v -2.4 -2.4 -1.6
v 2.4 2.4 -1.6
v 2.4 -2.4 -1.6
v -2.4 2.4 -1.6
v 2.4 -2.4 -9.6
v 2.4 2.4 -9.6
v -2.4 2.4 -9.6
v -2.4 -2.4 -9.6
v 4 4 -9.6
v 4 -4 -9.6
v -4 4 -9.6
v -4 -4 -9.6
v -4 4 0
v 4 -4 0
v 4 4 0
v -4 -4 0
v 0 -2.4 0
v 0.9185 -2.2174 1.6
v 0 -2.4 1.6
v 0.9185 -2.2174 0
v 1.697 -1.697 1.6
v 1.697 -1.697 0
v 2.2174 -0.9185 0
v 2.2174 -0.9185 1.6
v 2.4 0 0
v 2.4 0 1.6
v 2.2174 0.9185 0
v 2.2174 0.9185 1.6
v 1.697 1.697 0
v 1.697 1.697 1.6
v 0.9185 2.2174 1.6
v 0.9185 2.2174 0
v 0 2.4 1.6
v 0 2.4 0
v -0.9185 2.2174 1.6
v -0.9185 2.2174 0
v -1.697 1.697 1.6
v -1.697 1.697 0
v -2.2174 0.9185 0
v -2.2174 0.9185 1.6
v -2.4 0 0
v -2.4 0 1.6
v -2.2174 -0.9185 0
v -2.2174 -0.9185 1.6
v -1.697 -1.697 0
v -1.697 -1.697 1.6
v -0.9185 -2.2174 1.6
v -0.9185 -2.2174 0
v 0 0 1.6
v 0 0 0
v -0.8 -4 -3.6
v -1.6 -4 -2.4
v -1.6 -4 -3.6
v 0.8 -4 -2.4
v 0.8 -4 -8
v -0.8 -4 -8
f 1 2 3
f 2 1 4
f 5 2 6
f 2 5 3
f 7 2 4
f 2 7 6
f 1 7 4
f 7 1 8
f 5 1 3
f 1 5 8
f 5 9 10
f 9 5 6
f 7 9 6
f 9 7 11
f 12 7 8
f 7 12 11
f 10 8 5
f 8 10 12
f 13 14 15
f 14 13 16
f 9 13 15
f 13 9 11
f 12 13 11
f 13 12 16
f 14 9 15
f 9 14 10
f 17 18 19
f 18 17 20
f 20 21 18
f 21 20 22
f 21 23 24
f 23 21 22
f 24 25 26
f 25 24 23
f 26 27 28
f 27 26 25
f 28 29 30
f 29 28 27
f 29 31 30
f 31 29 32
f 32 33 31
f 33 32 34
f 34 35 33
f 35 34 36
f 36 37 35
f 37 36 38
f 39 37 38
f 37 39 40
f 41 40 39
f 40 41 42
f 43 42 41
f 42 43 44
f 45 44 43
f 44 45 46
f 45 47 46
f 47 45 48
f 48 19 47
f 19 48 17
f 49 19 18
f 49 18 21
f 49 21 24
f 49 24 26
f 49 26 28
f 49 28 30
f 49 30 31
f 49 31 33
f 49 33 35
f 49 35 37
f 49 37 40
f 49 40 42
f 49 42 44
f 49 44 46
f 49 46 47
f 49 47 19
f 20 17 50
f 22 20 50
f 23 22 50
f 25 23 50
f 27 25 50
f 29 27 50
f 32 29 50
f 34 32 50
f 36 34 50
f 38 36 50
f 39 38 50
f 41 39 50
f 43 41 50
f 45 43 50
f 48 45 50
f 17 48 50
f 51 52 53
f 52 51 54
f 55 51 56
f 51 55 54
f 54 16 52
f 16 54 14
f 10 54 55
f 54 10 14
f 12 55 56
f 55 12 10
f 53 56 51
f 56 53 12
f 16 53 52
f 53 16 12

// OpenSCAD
// file: ../p/4-4edge.scad
use <../lib.scad>
function ldraw_lib__4_4edge() = [
// 0 Circle 1.0
// 0 Name: 4-4edge.dat
// 0 Author: James Jessiman
// 0 !LDRAW_ORG Primitive UPDATE 2017-01
// 0 !LICENSE Licensed under CC BY 2.0 and CC BY 4.0 : see CAreadme.txt
// 
// 0 BFC CERTIFY CCW
  [0,"BFC","CERTIFY"],
  [0,"BFC","CCW"],
// 
// 0 !HISTORY 1998-12-15 [PTadmin] Official Update 1998-10
// 0 !HISTORY 2005-12-28 [PTadmin] Official Update 2005-01
// 0 !HISTORY 2007-06-24 [PTadmin] Header formatted for Contributor Agreement
// 0 !HISTORY 2008-07-01 [PTadmin] Official Update 2008-01
// 0 !HISTORY 2017-01-15 [Steffen] BFCed
// 0 !HISTORY 2017-12-30 [PTadmin] Official Update 2017-01
// 
// 
// 2 24 1 0 0 0.9239 0 0.3827
  [2,24,1,0,0,0.9239,0,0.3827],
// 2 24 0.9239 0 0.3827 0.7071 0 0.7071
  [2,24,0.9239,0,0.3827,0.7071,0,0.7071],
// 2 24 0.7071 0 0.7071 0.3827 0 0.9239
  [2,24,0.7071,0,0.7071,0.3827,0,0.9239],
// 2 24 0.3827 0 0.9239 0 0 1
  [2,24,0.3827,0,0.9239,0,0,1],
// 2 24 0 0 1 -0.3827 0 0.9239
  [2,24,0,0,1,-0.3827,0,0.9239],
// 2 24 -0.3827 0 0.9239 -0.7071 0 0.7071
  [2,24,-0.3827,0,0.9239,-0.7071,0,0.7071],
// 2 24 -0.7071 0 0.7071 -0.9239 0 0.3827
  [2,24,-0.7071,0,0.7071,-0.9239,0,0.3827],
// 2 24 -0.9239 0 0.3827 -1 0 -0
  [2,24,-0.9239,0,0.3827,-1,0,-0],
// 2 24 -1 0 -0 -0.9239 0 -0.3827
  [2,24,-1,0,-0,-0.9239,0,-0.3827],
// 2 24 -0.9239 0 -0.3827 -0.7071 0 -0.7071
  [2,24,-0.9239,0,-0.3827,-0.7071,0,-0.7071],
// 2 24 -0.7071 0 -0.7071 -0.3827 0 -0.9239
  [2,24,-0.7071,0,-0.7071,-0.3827,0,-0.9239],
// 2 24 -0.3827 0 -0.9239 0 0 -1
  [2,24,-0.3827,0,-0.9239,0,0,-1],
// 2 24 0 0 -1 0.3827 0 -0.9239
  [2,24,0,0,-1,0.3827,0,-0.9239],
// 2 24 0.3827 0 -0.9239 0.7071 0 -0.7071
  [2,24,0.3827,0,-0.9239,0.7071,0,-0.7071],
// 2 24 0.7071 0 -0.7071 0.9239 0 -0.3827
  [2,24,0.7071,0,-0.7071,0.9239,0,-0.3827],
// 2 24 0.9239 0 -0.3827 1 0 0
  [2,24,0.9239,0,-0.3827,1,0,0],
];
module ldraw_lib__4_4edge(step=0, col=false, unit=2/5, alt=false, line=0.2, solid=!$preview)
    makepoly(ldraw_lib__4_4edge(), step=step, col=col, unit=unit, alt=alt, line=line, solid=solid);
ldraw_lib__4_4edge(line=0.2);
// file: ../p/4-4disc.scad
use <../lib.scad>
function ldraw_lib__4_4disc() = [
// 0 Disc 1.0
// 0 Name: 4-4disc.dat
// 0 Author: James Jessiman
// 0 !LDRAW_ORG Primitive UPDATE 2002-02
// 0 !LICENSE Licensed under CC BY 2.0 and CC BY 4.0 : see CAreadme.txt
// 
// 0 BFC CERTIFY CCW
  [0,"BFC","CERTIFY"],
  [0,"BFC","CCW"],
// 
// 0 !HISTORY 1998-12-15 [PTadmin] Official Update 1998-10
// 0 !HISTORY 2002-03-23 [sbliss] Added BFC statement
// 0 !HISTORY 2002-04-25 [PTadmin] Official Update 2002-02
// 0 !HISTORY 2007-06-24 [PTadmin] Header formatted for Contributor Agreement
// 0 !HISTORY 2008-07-01 [PTadmin] Official Update 2008-01
// 
// 
// 3 16 0 0 0 1 0 0 0.9239 0 0.3827
  [3,16,0,0,0,1,0,0,0.9239,0,0.3827],
// 3 16 0 0 0 0.9239 0 0.3827 0.7071 0 0.7071
  [3,16,0,0,0,0.9239,0,0.3827,0.7071,0,0.7071],
// 3 16 0 0 0 0.7071 0 0.7071 0.3827 0 0.9239
  [3,16,0,0,0,0.7071,0,0.7071,0.3827,0,0.9239],
// 3 16 0 0 0 0.3827 0 0.9239 0 0 1
  [3,16,0,0,0,0.3827,0,0.9239,0,0,1],
// 3 16 0 0 0 0 0 1 -0.3827 0 0.9239
  [3,16,0,0,0,0,0,1,-0.3827,0,0.9239],
// 3 16 0 0 0 -0.3827 0 0.9239 -0.7071 0 0.7071
  [3,16,0,0,0,-0.3827,0,0.9239,-0.7071,0,0.7071],
// 3 16 0 0 0 -0.7071 0 0.7071 -0.9239 0 0.3827
  [3,16,0,0,0,-0.7071,0,0.7071,-0.9239,0,0.3827],
// 3 16 0 0 0 -0.9239 0 0.3827 -1 0 -0
  [3,16,0,0,0,-0.9239,0,0.3827,-1,0,-0],
// 3 16 0 0 0 -1 0 -0 -0.9239 0 -0.3827
  [3,16,0,0,0,-1,0,-0,-0.9239,0,-0.3827],
// 3 16 0 0 0 -0.9239 0 -0.3827 -0.7071 0 -0.7071
  [3,16,0,0,0,-0.9239,0,-0.3827,-0.7071,0,-0.7071],
// 3 16 0 0 0 -0.7071 0 -0.7071 -0.3827 0 -0.9239
  [3,16,0,0,0,-0.7071,0,-0.7071,-0.3827,0,-0.9239],
// 3 16 0 0 0 -0.3827 0 -0.9239 0 0 -1
  [3,16,0,0,0,-0.3827,0,-0.9239,0,0,-1],
// 3 16 0 0 0 0 0 -1 0.3827 0 -0.9239
  [3,16,0,0,0,0,0,-1,0.3827,0,-0.9239],
// 3 16 0 0 0 0.3827 0 -0.9239 0.7071 0 -0.7071
  [3,16,0,0,0,0.3827,0,-0.9239,0.7071,0,-0.7071],
// 3 16 0 0 0 0.7071 0 -0.7071 0.9239 0 -0.3827
  [3,16,0,0,0,0.7071,0,-0.7071,0.9239,0,-0.3827],
// 3 16 0 0 0 0.9239 0 -0.3827 1 0 0
  [3,16,0,0,0,0.9239,0,-0.3827,1,0,0],
// 0
];
module ldraw_lib__4_4disc(step=0, col=false, unit=2/5, alt=false, line=0.2, solid=!$preview)
    makepoly(ldraw_lib__4_4disc(), step=step, col=col, unit=unit, alt=alt, line=line, solid=solid);
ldraw_lib__4_4disc(line=0.2);
// file: ../p/4-4cyli.scad
use <../lib.scad>
$fa=1; $fs=0.2;
function ldraw_lib__4_4cyli(realsolid=false) = [
// 0 Cylinder 1.0
// 0 Name: 4-4cyli.dat
// 0 Author: James Jessiman
// 0 !LDRAW_ORG Primitive UPDATE 2005-01
// 0 !LICENSE Licensed under CC BY 2.0 and CC BY 4.0 : see CAreadme.txt
// 
// 0 BFC CERTIFY CCW
  [0,"BFC","CERTIFY"],
  [0,"BFC","CCW"],
// 
// 0 !HISTORY 1998-12-15 [PTadmin] Official Update 1998-10
// 0 !HISTORY 2002-03-23 [sbliss] Added BFC statement; merged headers from files in distributions LDraw 0.27 and Complete.
// 0 !HISTORY 2002-04-25 [PTadmin] Official Update 2002-02
// 0 !HISTORY 2004-12-14 [guyvivan] BFC CCW
// 0 !HISTORY 2005-12-28 [PTadmin] Official Update 2005-01
// 0 !HISTORY 2007-06-24 [PTadmin] Header formatted for Contributor Agreement
// 0 !HISTORY 2008-07-01 [PTadmin] Official Update 2008-01
// 
// 
// 4 16 1 1 0 0.9239 1 0.3827 0.9239 0 0.3827 1 0 0
  [4,16,1,1,0,0.9239,1,0.3827,0.9239,0,0.3827,1,0,0],
// 5 24 1 0 0 1 1 0 0.9239 0 0.3827 0.9239 0 -0.3827
  [5,24,1,0,0,1,1,0,0.9239,0,0.3827,0.9239,0,-0.3827],
// 4 16 0.9239 1 0.3827 0.7071 1 0.7071 0.7071 0 0.7071 0.9239 0 0.3827
  [4,16,0.9239,1,0.3827,0.7071,1,0.7071,0.7071,0,0.7071,0.9239,0,0.3827],
// 5 24 0.9239 0 0.3827 0.9239 1 0.3827 0.7071 0 0.7071 1 0 0
  [5,24,0.9239,0,0.3827,0.9239,1,0.3827,0.7071,0,0.7071,1,0,0],
// 4 16 0.7071 1 0.7071 0.3827 1 0.9239 0.3827 0 0.9239 0.7071 0 0.7071
  [4,16,0.7071,1,0.7071,0.3827,1,0.9239,0.3827,0,0.9239,0.7071,0,0.7071],
// 5 24 0.7071 0 0.7071 0.7071 1 0.7071 0.3827 0 0.9239 0.9239 0 0.3827
  [5,24,0.7071,0,0.7071,0.7071,1,0.7071,0.3827,0,0.9239,0.9239,0,0.3827],
// 4 16 0.3827 1 0.9239 0 1 1 0 0 1 0.3827 0 0.9239
  [4,16,0.3827,1,0.9239,0,1,1,0,0,1,0.3827,0,0.9239],
// 5 24 0.3827 0 0.9239 0.3827 1 0.9239 0 0 1 0.7071 0 0.7071
  [5,24,0.3827,0,0.9239,0.3827,1,0.9239,0,0,1,0.7071,0,0.7071],
// 4 16 0 1 1 -0.3827 1 0.9239 -0.3827 0 0.9239 0 0 1
  [4,16,0,1,1,-0.3827,1,0.9239,-0.3827,0,0.9239,0,0,1],
// 5 24 0 0 1 0 1 1 -0.3827 0 0.9239 0.3827 0 0.9239
  [5,24,0,0,1,0,1,1,-0.3827,0,0.9239,0.3827,0,0.9239],
// 4 16 -0.3827 1 0.9239 -0.7071 1 0.7071 -0.7071 0 0.7071 -0.3827 0 0.9239
  [4,16,-0.3827,1,0.9239,-0.7071,1,0.7071,-0.7071,0,0.7071,-0.3827,0,0.9239],
// 5 24 -0.3827 0 0.9239 -0.3827 1 0.9239 -0.7071 0 0.7071 0 0 1
  [5,24,-0.3827,0,0.9239,-0.3827,1,0.9239,-0.7071,0,0.7071,0,0,1],
// 4 16 -0.7071 1 0.7071 -0.9239 1 0.3827 -0.9239 0 0.3827 -0.7071 0 0.7071
  [4,16,-0.7071,1,0.7071,-0.9239,1,0.3827,-0.9239,0,0.3827,-0.7071,0,0.7071],
// 5 24 -0.7071 0 0.7071 -0.7071 1 0.7071 -0.9239 0 0.3827 -0.3827 0 0.9239
  [5,24,-0.7071,0,0.7071,-0.7071,1,0.7071,-0.9239,0,0.3827,-0.3827,0,0.9239],
// 4 16 -0.9239 1 0.3827 -1 1 0 -1 0 0 -0.9239 0 0.3827
  [4,16,-0.9239,1,0.3827,-1,1,0,-1,0,0,-0.9239,0,0.3827],
// 5 24 -0.9239 0 0.3827 -0.9239 1 0.3827 -1 0 0 -0.7071 0 0.7071
  [5,24,-0.9239,0,0.3827,-0.9239,1,0.3827,-1,0,0,-0.7071,0,0.7071],
// 4 16 -1 1 0 -0.9239 1 -0.3827 -0.9239 0 -0.3827 -1 0 0
  [4,16,-1,1,0,-0.9239,1,-0.3827,-0.9239,0,-0.3827,-1,0,0],
// 5 24 -1 0 0 -1 1 0 -0.9239 0 -0.3827 -0.9239 0 0.3827
  [5,24,-1,0,0,-1,1,0,-0.9239,0,-0.3827,-0.9239,0,0.3827],
// 4 16 -0.9239 1 -0.3827 -0.7071 1 -0.7071 -0.7071 0 -0.7071 -0.9239 0 -0.3827
  [4,16,-0.9239,1,-0.3827,-0.7071,1,-0.7071,-0.7071,0,-0.7071,-0.9239,0,-0.3827],
// 5 24 -0.9239 0 -0.3827 -0.9239 1 -0.3827 -0.7071 0 -0.7071 -1 0 0
  [5,24,-0.9239,0,-0.3827,-0.9239,1,-0.3827,-0.7071,0,-0.7071,-1,0,0],
// 4 16 -0.7071 1 -0.7071 -0.3827 1 -0.9239 -0.3827 0 -0.9239 -0.7071 0 -0.7071
  [4,16,-0.7071,1,-0.7071,-0.3827,1,-0.9239,-0.3827,0,-0.9239,-0.7071,0,-0.7071],
// 5 24 -0.7071 0 -0.7071 -0.7071 1 -0.7071 -0.3827 0 -0.9239 -0.9239 0 -0.3827
  [5,24,-0.7071,0,-0.7071,-0.7071,1,-0.7071,-0.3827,0,-0.9239,-0.9239,0,-0.3827],
// 4 16 -0.3827 1 -0.9239 0 1 -1 0 0 -1 -0.3827 0 -0.9239
  [4,16,-0.3827,1,-0.9239,0,1,-1,0,0,-1,-0.3827,0,-0.9239],
// 5 24 -0.3827 0 -0.9239 -0.3827 1 -0.9239 0 0 -1 -0.7071 0 -0.7071
  [5,24,-0.3827,0,-0.9239,-0.3827,1,-0.9239,0,0,-1,-0.7071,0,-0.7071],
// 4 16 0 1 -1 0.3827 1 -0.9239 0.3827 0 -0.9239 0 0 -1
  [4,16,0,1,-1,0.3827,1,-0.9239,0.3827,0,-0.9239,0,0,-1],
// 5 24 0 0 -1 0 1 -1 0.3827 0 -0.9239 -0.3827 0 -0.9239
  [5,24,0,0,-1,0,1,-1,0.3827,0,-0.9239,-0.3827,0,-0.9239],
// 4 16 0.3827 1 -0.9239 0.7071 1 -0.7071 0.7071 0 -0.7071 0.3827 0 -0.9239
  [4,16,0.3827,1,-0.9239,0.7071,1,-0.7071,0.7071,0,-0.7071,0.3827,0,-0.9239],
// 5 24 0.3827 0 -0.9239 0.3827 1 -0.9239 0.7071 0 -0.7071 0 0 -1
  [5,24,0.3827,0,-0.9239,0.3827,1,-0.9239,0.7071,0,-0.7071,0,0,-1],
// 4 16 0.7071 1 -0.7071 0.9239 1 -0.3827 0.9239 0 -0.3827 0.7071 0 -0.7071
  [4,16,0.7071,1,-0.7071,0.9239,1,-0.3827,0.9239,0,-0.3827,0.7071,0,-0.7071],
// 5 24 0.7071 0 -0.7071 0.7071 1 -0.7071 0.9239 0 -0.3827 0.3827 0 -0.9239
  [5,24,0.7071,0,-0.7071,0.7071,1,-0.7071,0.9239,0,-0.3827,0.3827,0,-0.9239],
// 4 16 0.9239 1 -0.3827 1 1 0 1 0 0 0.9239 0 -0.3827
  [4,16,0.9239,1,-0.3827,1,1,0,1,0,0,0.9239,0,-0.3827],
// 5 24 0.9239 0 -0.3827 0.9239 1 -0.3827 1 0 0 0.7071 0 -0.7071
  [5,24,0.9239,0,-0.3827,0.9239,1,-0.3827,1,0,0,0.7071,0,-0.7071],
// 0
];
module ldraw_lib__4_4cyli(step=0, col=false, unit=2/5, alt=false, line=0.2, solid=!$preview)
    makepoly(ldraw_lib__4_4cyli(solid), step=step, col=col, unit=unit, alt=alt, line=line, solid=solid);
ldraw_lib__4_4cyli(line=0.2);
// file: ../p/stud.scad
use <../lib.scad>
use <4-4cyli.scad>
use <4-4disc.scad>
use <4-4edge.scad>
function ldraw_lib__stud() = [
// 0 Stud
// 0 Name: stud.dat
// 0 Author: James Jessiman
// 0 !LDRAW_ORG Primitive UPDATE 2012-01
// 0 !LICENSE Licensed under CC BY 4.0 : see CAreadme.txt
// 
// 0 BFC CERTIFY CCW
  [0,"BFC","CERTIFY"],
  [0,"BFC","CCW"],
// 
// 0 !HISTORY 2002-04-04 [sbliss] Modified for BFC compliance
// 0 !HISTORY 2002-04-25 [PTadmin] Official Update 2002-02
// 0 !HISTORY 2007-06-24 [PTadmin] Header formatted for Contributor Agreement
// 0 !HISTORY 2008-07-01 [PTadmin] Official Update 2008-01
// 0 !HISTORY 2012-02-16 [Philo] Changed to CCW
// 0 !HISTORY 2012-03-30 [PTadmin] Official Update 2012-01
// 
// 
// 1 16 0 0 0 6 0 0 0 1 0 0 0 6 4-4edge.dat
  [1,16,0,0,0,6,0,0,0,1,0,0,0,6, ldraw_lib__4_4edge()],
// 1 16 0 -4 0 6 0 0 0 1 0 0 0 6 4-4edge.dat
  [1,16,0,-4,0,6,0,0,0,1,0,0,0,6, ldraw_lib__4_4edge()],
// 1 16 0 0 0 6 0 0 0 -4 0 0 0 6 4-4cyli.dat
  [1,16,0,0,0,6,0,0,0,-4,0,0,0,6, ldraw_lib__4_4cyli()],
// 1 16 0 -4 0 6 0 0 0 1 0 0 0 6 4-4disc.dat
  [1,16,0,-4,0,6,0,0,0,1,0,0,0,6, ldraw_lib__4_4disc()],
  [-1,16,0,0,0,6,0,0,0,-1,0,0,0,6, ldraw_lib__4_4disc()],
];
module ldraw_lib__stud(step=0, col=false, unit=2/5, alt=false, line=0.2, solid=!$preview)
    makepoly(ldraw_lib__stud(), step=step, col=col, unit=unit, alt=alt, line=line, solid=solid);
ldraw_lib__stud(line=0.2);
// file: ../p/box5.scad
use <../lib.scad>
function ldraw_lib__box5() = [
// 0 Box with 5 Faces and All Edges
// 0 Name: box5.dat
// 0 Author: James Jessiman
// 0 !LDRAW_ORG Primitive UPDATE 2012-01
// 0 !LICENSE Licensed under CC BY 2.0 and CC BY 4.0 : see CAreadme.txt
// 
// 0 BFC CERTIFY CCW
  [0,"BFC","CERTIFY"],
  [0,"BFC","CCW"],
// 
// 0 !HISTORY 2002-04-03 [sbliss] Modified for BFC compliance
// 0 !HISTORY 2002-04-25 [PTadmin] Official Update 2002-02
// 0 !HISTORY 2007-06-24 [PTadmin] Header formatted for Contributor Agreement
// 0 !HISTORY 2008-07-01 [PTadmin] Official Update 2008-01
// 0 !HISTORY 2012-02-16 [Philo] Changed to CCW
// 0 !HISTORY 2012-03-30 [PTadmin] Official Update 2012-01
// 
// 
// 2 24 1 1 1 -1 1 1
  [2,24,1,1,1,-1,1,1],
// 2 24 -1 1 1 -1 1 -1
  [2,24,-1,1,1,-1,1,-1],
// 2 24 -1 1 -1 1 1 -1
  [2,24,-1,1,-1,1,1,-1],
// 2 24 1 1 -1 1 1 1
  [2,24,1,1,-1,1,1,1],
// 2 24 1 0 1 -1 0 1
  [2,24,1,0,1,-1,0,1],
// 2 24 -1 0 1 -1 0 -1
  [2,24,-1,0,1,-1,0,-1],
// 2 24 -1 0 -1 1 0 -1
  [2,24,-1,0,-1,1,0,-1],
// 2 24 1 0 -1 1 0 1
  [2,24,1,0,-1,1,0,1],
// 2 24 1 0 1 1 1 1
  [2,24,1,0,1,1,1,1],
// 2 24 -1 0 1 -1 1 1
  [2,24,-1,0,1,-1,1,1],
// 2 24 1 0 -1 1 1 -1
  [2,24,1,0,-1,1,1,-1],
// 2 24 -1 0 -1 -1 1 -1
  [2,24,-1,0,-1,-1,1,-1],
// 4 16 -1 1 1 1 1 1 1 1 -1 -1 1 -1
  [4,16,-1,1,1,1,1,1,1,1,-1,-1,1,-1],
// 4 16 -1 1 1 -1 0 1 1 0 1 1 1 1
  [4,16,-1,1,1,-1,0,1,1,0,1,1,1,1],
// 4 16 -1 1 -1 -1 0 -1 -1 0 1 -1 1 1
  [4,16,-1,1,-1,-1,0,-1,-1,0,1,-1,1,1],
// 4 16 1 1 -1 1 0 -1 -1 0 -1 -1 1 -1
  [4,16,1,1,-1,1,0,-1,-1,0,-1,-1,1,-1],
// 4 16 1 1 1 1 0 1 1 0 -1 1 1 -1
  [4,16,1,1,1,1,0,1,1,0,-1,1,1,-1],
];
makepoly(ldraw_lib__box5(), line=0.2);
// file: ../p/box4t.scad
use <../lib.scad>
function ldraw_lib__box4t() = [
// 0 Box with 4 Adjacent Faces and All Edges
// 0 Name: box4t.dat
// 0 Author: Tore Eriksson [Tore_Eriksson]
// 0 !LDRAW_ORG Primitive UPDATE 2003-02
// 0 !LICENSE Licensed under CC BY 2.0 and CC BY 4.0 : see CAreadme.txt
// 
// 0 BFC CERTIFY CCW
  [0,"BFC","CERTIFY"],
  [0,"BFC","CCW"],
// 
// 0 !HISTORY 1997-09-29 [PTadmin] Official Update 1997-15
// 0 !HISTORY 2002-08-31 [izanette] Modified with WINDZ for BFC compliance
// 0 !HISTORY 2003-08-01 [PTadmin] Official Update 2003-02
// 0 !HISTORY 2007-06-24 [PTadmin] Header formatted for Contributor Agreement
// 0 !HISTORY 2008-07-01 [PTadmin] Official Update 2008-01
// 
// 
// 2 24 1 1 1 -1 1 1
  [2,24,1,1,1,-1,1,1],
// 2 24 -1 1 1 -1 1 -1
  [2,24,-1,1,1,-1,1,-1],
// 2 24 -1 1 -1 1 1 -1
  [2,24,-1,1,-1,1,1,-1],
// 2 24 1 1 -1 1 1 1
  [2,24,1,1,-1,1,1,1],
// 2 24 1 0 1 -1 0 1
  [2,24,1,0,1,-1,0,1],
// 2 24 -1 0 1 -1 0 -1
  [2,24,-1,0,1,-1,0,-1],
// 2 24 -1 0 -1 1 0 -1
  [2,24,-1,0,-1,1,0,-1],
// 2 24 1 0 -1 1 0 1
  [2,24,1,0,-1,1,0,1],
// 2 24 1 0 1 1 1 1
  [2,24,1,0,1,1,1,1],
// 2 24 -1 0 1 -1 1 1
  [2,24,-1,0,1,-1,1,1],
// 2 24 1 0 -1 1 1 -1
  [2,24,1,0,-1,1,1,-1],
// 2 24 -1 0 -1 -1 1 -1
  [2,24,-1,0,-1,-1,1,-1],
// 4 16 1 1 1 1 1 -1 -1 1 -1 -1 1 1
  [4,16,1,1,1,1,1,-1,-1,1,-1,-1,1,1],
// 4 16 1 1 1 -1 1 1 -1 0 1 1 0 1
  [4,16,1,1,1,-1,1,1,-1,0,1,1,0,1],
// 4 16 -1 1 1 -1 1 -1 -1 0 -1 -1 0 1
  [4,16,-1,1,1,-1,1,-1,-1,0,-1,-1,0,1],
// 0 4 16 -1 1 -1 -1 0 -1 1 0 -1 1 1 -1
// 4 16 1 1 -1 1 1 1 1 0 1 1 0 -1
  [4,16,1,1,-1,1,1,1,1,0,1,1,0,-1],
// 0
];
makepoly(ldraw_lib__box4t(), line=0.2);
// file: s/3005s01.scad
use <../../lib.scad>
use <../../p/box4t.scad>
use <../../p/box5.scad>
use <../../p/stud.scad>
function ldraw_lib__s__3005s01() = [
// 0 ~Brick  1 x  1 without Front Face
// 0 Name: s\3005s01.dat
// 0 Author: John Riley [jriley]
// 0 !LDRAW_ORG Subpart UPDATE 2004-01
// 0 !LICENSE Licensed under CC BY 2.0 and CC BY 4.0 : see CAreadme.txt
// 
// 0 BFC CERTIFY CCW
  [0,"BFC","CERTIFY"],
  [0,"BFC","CCW"],
// 
// 0 !HISTORY 2003-09-07 [jriley] BFCed & Subfiled
// 0 !HISTORY 2004-03-02 [PTadmin] Official Update 2004-01
// 0 !HISTORY 2007-08-29 [PTadmin] Header formatted for Contributor Agreement
// 0 !HISTORY 2008-07-01 [PTadmin] Official Update 2008-01
// 
// 
// 0 BFC INVERTNEXT
  [0,"BFC","INVERTNEXT"],
// 1 16 0 24 0 0 0 6 0 -20 0 -6 0 0 box5.dat
  [1,16,0,24,0,0,0,6,0,-20,0,-6,0,0, ldraw_lib__box5()],
// 4 16 10 24 -10 6 24 -6 6 24 6 10 24 10
  [4,16,10,24,-10,6,24,-6,6,24,6,10,24,10],
// 4 16 10 24 10 6 24 6 -6 24 6 -10 24 10
  [4,16,10,24,10,6,24,6,-6,24,6,-10,24,10],
// 4 16 -10 24 10 -6 24 6 -6 24 -6 -10 24 -10
  [4,16,-10,24,10,-6,24,6,-6,24,-6,-10,24,-10],
// 4 16 -10 24 -10 -6 24 -6 6 24 -6 10 24 -10
  [4,16,-10,24,-10,-6,24,-6,6,24,-6,10,24,-10],
// 1 16 0 24 0 10 0 0 0 -24 0 0 0 10 box4t.dat
  [1,16,0,24,0,10,0,0,0,-24,0,0,0,10, ldraw_lib__box4t()],
// 1 16 0 0 0 0 0 1 0 1 0 -1 0 0 stud.dat
  [1,16,0,0,0,0,0,1,0,1,0,-1,0,0, ldraw_lib__stud()],
// 0
];
module ldraw_lib__s__3005s01(step=0, col=false, unit=2/5, alt=false, line=0.2, solid=!$preview)
    makepoly(ldraw_lib__s__3005s01(), step=step, col=col, unit=unit, alt=alt, line=line, solid=solid);
ldraw_lib__s__3005s01(line=0.2);
// main file
use <../lib.scad>
use <s/3005s01.scad>
function ldraw_lib__3005pv1() = [
// 0 Brick  1 x  1 with Blue Bold "1" Pattern
// 0 Name: 3005pv1.dat
// 0 Author: Tore Eriksson [Tore_Eriksson]
// 0 !LDRAW_ORG Part UPDATE 2025-09
// 0 !LICENSE Licensed under CC BY 4.0 : see CAreadme.txt
// 
// 0 BFC CERTIFY CCW
  [0,"BFC","CERTIFY"],
  [0,"BFC","CCW"],
// 
// 0 !KEYWORDS BrickLink 3005pt1b, letters, numbers, Rebrickable 3005pr9988
// 0 !KEYWORDS Set 987
// 
// 0 !HISTORY 2003-12-09 [Steffen] made use of existing subfile
// 0 !HISTORY 2004-04-22 [PTadmin] Official Update 2004-02
// 0 !HISTORY 2007-05-11 [PTadmin] Header formatted for Contributor Agreement
// 0 !HISTORY 2008-07-01 [PTadmin] Official Update 2008-01
// 0 !HISTORY 2017-01-02 [Tore_Eriksson] Changed pattern color, pattern adjusted, BFCed
// 0 !HISTORY 2017-12-30 [PTadmin] Official Update 2017-01
// 0 !HISTORY 2025-09-27 [OrionP] Changed winding to CCW
// 0 !HISTORY 2025-09-29 [OrionP] Official Update 2025-09
// 
// 1 16 0 0 0 1 0 0 0 1 0 0 0 1 s\3005s01.dat
  [1,16,0,0,0,1,0,0,0,1,0,0,0,1, ldraw_lib__s__3005s01()],
// 
// 4 1 -4 9 -10 -2 9 -10 2 6 -10 -4 6 -10
  [4,1,-4,9,-10,-2,9,-10,2,6,-10,-4,6,-10],
// 4 1 2 6 -10 -2 9 -10 -2 20 -10 2 20 -10
  [4,1,2,6,-10,-2,9,-10,-2,20,-10,2,20,-10],
// 4 16 -4 6 -10 2 6 -10 10 0 -10 -10 0 -10
  [4,16,-4,6,-10,2,6,-10,10,0,-10,-10,0,-10],
// 4 16 2 6 -10 2 20 -10 10 24 -10 10 0 -10
  [4,16,2,6,-10,2,20,-10,10,24,-10,10,0,-10],
// 4 16 2 20 -10 -2 20 -10 -10 24 -10 10 24 -10
  [4,16,2,20,-10,-2,20,-10,-10,24,-10,10,24,-10],
// 4 16 -2 20 -10 -2 9 -10 -4 9 -10 -10 24 -10
  [4,16,-2,20,-10,-2,9,-10,-4,9,-10,-10,24,-10],
// 4 16 -4 9 -10 -4 6 -10 -10 0 -10 -10 24 -10
  [4,16,-4,9,-10,-4,6,-10,-10,0,-10,-10,24,-10],
// 0
];
module ldraw_lib__3005pv1(step=0, col=false, unit=2/5, alt=false, line=0.2, solid=!$preview)
    makepoly(ldraw_lib__3005pv1(), step=step, col=col, unit=unit, alt=alt, line=line, solid=solid);
ldraw_lib__3005pv1(line=0.2);
